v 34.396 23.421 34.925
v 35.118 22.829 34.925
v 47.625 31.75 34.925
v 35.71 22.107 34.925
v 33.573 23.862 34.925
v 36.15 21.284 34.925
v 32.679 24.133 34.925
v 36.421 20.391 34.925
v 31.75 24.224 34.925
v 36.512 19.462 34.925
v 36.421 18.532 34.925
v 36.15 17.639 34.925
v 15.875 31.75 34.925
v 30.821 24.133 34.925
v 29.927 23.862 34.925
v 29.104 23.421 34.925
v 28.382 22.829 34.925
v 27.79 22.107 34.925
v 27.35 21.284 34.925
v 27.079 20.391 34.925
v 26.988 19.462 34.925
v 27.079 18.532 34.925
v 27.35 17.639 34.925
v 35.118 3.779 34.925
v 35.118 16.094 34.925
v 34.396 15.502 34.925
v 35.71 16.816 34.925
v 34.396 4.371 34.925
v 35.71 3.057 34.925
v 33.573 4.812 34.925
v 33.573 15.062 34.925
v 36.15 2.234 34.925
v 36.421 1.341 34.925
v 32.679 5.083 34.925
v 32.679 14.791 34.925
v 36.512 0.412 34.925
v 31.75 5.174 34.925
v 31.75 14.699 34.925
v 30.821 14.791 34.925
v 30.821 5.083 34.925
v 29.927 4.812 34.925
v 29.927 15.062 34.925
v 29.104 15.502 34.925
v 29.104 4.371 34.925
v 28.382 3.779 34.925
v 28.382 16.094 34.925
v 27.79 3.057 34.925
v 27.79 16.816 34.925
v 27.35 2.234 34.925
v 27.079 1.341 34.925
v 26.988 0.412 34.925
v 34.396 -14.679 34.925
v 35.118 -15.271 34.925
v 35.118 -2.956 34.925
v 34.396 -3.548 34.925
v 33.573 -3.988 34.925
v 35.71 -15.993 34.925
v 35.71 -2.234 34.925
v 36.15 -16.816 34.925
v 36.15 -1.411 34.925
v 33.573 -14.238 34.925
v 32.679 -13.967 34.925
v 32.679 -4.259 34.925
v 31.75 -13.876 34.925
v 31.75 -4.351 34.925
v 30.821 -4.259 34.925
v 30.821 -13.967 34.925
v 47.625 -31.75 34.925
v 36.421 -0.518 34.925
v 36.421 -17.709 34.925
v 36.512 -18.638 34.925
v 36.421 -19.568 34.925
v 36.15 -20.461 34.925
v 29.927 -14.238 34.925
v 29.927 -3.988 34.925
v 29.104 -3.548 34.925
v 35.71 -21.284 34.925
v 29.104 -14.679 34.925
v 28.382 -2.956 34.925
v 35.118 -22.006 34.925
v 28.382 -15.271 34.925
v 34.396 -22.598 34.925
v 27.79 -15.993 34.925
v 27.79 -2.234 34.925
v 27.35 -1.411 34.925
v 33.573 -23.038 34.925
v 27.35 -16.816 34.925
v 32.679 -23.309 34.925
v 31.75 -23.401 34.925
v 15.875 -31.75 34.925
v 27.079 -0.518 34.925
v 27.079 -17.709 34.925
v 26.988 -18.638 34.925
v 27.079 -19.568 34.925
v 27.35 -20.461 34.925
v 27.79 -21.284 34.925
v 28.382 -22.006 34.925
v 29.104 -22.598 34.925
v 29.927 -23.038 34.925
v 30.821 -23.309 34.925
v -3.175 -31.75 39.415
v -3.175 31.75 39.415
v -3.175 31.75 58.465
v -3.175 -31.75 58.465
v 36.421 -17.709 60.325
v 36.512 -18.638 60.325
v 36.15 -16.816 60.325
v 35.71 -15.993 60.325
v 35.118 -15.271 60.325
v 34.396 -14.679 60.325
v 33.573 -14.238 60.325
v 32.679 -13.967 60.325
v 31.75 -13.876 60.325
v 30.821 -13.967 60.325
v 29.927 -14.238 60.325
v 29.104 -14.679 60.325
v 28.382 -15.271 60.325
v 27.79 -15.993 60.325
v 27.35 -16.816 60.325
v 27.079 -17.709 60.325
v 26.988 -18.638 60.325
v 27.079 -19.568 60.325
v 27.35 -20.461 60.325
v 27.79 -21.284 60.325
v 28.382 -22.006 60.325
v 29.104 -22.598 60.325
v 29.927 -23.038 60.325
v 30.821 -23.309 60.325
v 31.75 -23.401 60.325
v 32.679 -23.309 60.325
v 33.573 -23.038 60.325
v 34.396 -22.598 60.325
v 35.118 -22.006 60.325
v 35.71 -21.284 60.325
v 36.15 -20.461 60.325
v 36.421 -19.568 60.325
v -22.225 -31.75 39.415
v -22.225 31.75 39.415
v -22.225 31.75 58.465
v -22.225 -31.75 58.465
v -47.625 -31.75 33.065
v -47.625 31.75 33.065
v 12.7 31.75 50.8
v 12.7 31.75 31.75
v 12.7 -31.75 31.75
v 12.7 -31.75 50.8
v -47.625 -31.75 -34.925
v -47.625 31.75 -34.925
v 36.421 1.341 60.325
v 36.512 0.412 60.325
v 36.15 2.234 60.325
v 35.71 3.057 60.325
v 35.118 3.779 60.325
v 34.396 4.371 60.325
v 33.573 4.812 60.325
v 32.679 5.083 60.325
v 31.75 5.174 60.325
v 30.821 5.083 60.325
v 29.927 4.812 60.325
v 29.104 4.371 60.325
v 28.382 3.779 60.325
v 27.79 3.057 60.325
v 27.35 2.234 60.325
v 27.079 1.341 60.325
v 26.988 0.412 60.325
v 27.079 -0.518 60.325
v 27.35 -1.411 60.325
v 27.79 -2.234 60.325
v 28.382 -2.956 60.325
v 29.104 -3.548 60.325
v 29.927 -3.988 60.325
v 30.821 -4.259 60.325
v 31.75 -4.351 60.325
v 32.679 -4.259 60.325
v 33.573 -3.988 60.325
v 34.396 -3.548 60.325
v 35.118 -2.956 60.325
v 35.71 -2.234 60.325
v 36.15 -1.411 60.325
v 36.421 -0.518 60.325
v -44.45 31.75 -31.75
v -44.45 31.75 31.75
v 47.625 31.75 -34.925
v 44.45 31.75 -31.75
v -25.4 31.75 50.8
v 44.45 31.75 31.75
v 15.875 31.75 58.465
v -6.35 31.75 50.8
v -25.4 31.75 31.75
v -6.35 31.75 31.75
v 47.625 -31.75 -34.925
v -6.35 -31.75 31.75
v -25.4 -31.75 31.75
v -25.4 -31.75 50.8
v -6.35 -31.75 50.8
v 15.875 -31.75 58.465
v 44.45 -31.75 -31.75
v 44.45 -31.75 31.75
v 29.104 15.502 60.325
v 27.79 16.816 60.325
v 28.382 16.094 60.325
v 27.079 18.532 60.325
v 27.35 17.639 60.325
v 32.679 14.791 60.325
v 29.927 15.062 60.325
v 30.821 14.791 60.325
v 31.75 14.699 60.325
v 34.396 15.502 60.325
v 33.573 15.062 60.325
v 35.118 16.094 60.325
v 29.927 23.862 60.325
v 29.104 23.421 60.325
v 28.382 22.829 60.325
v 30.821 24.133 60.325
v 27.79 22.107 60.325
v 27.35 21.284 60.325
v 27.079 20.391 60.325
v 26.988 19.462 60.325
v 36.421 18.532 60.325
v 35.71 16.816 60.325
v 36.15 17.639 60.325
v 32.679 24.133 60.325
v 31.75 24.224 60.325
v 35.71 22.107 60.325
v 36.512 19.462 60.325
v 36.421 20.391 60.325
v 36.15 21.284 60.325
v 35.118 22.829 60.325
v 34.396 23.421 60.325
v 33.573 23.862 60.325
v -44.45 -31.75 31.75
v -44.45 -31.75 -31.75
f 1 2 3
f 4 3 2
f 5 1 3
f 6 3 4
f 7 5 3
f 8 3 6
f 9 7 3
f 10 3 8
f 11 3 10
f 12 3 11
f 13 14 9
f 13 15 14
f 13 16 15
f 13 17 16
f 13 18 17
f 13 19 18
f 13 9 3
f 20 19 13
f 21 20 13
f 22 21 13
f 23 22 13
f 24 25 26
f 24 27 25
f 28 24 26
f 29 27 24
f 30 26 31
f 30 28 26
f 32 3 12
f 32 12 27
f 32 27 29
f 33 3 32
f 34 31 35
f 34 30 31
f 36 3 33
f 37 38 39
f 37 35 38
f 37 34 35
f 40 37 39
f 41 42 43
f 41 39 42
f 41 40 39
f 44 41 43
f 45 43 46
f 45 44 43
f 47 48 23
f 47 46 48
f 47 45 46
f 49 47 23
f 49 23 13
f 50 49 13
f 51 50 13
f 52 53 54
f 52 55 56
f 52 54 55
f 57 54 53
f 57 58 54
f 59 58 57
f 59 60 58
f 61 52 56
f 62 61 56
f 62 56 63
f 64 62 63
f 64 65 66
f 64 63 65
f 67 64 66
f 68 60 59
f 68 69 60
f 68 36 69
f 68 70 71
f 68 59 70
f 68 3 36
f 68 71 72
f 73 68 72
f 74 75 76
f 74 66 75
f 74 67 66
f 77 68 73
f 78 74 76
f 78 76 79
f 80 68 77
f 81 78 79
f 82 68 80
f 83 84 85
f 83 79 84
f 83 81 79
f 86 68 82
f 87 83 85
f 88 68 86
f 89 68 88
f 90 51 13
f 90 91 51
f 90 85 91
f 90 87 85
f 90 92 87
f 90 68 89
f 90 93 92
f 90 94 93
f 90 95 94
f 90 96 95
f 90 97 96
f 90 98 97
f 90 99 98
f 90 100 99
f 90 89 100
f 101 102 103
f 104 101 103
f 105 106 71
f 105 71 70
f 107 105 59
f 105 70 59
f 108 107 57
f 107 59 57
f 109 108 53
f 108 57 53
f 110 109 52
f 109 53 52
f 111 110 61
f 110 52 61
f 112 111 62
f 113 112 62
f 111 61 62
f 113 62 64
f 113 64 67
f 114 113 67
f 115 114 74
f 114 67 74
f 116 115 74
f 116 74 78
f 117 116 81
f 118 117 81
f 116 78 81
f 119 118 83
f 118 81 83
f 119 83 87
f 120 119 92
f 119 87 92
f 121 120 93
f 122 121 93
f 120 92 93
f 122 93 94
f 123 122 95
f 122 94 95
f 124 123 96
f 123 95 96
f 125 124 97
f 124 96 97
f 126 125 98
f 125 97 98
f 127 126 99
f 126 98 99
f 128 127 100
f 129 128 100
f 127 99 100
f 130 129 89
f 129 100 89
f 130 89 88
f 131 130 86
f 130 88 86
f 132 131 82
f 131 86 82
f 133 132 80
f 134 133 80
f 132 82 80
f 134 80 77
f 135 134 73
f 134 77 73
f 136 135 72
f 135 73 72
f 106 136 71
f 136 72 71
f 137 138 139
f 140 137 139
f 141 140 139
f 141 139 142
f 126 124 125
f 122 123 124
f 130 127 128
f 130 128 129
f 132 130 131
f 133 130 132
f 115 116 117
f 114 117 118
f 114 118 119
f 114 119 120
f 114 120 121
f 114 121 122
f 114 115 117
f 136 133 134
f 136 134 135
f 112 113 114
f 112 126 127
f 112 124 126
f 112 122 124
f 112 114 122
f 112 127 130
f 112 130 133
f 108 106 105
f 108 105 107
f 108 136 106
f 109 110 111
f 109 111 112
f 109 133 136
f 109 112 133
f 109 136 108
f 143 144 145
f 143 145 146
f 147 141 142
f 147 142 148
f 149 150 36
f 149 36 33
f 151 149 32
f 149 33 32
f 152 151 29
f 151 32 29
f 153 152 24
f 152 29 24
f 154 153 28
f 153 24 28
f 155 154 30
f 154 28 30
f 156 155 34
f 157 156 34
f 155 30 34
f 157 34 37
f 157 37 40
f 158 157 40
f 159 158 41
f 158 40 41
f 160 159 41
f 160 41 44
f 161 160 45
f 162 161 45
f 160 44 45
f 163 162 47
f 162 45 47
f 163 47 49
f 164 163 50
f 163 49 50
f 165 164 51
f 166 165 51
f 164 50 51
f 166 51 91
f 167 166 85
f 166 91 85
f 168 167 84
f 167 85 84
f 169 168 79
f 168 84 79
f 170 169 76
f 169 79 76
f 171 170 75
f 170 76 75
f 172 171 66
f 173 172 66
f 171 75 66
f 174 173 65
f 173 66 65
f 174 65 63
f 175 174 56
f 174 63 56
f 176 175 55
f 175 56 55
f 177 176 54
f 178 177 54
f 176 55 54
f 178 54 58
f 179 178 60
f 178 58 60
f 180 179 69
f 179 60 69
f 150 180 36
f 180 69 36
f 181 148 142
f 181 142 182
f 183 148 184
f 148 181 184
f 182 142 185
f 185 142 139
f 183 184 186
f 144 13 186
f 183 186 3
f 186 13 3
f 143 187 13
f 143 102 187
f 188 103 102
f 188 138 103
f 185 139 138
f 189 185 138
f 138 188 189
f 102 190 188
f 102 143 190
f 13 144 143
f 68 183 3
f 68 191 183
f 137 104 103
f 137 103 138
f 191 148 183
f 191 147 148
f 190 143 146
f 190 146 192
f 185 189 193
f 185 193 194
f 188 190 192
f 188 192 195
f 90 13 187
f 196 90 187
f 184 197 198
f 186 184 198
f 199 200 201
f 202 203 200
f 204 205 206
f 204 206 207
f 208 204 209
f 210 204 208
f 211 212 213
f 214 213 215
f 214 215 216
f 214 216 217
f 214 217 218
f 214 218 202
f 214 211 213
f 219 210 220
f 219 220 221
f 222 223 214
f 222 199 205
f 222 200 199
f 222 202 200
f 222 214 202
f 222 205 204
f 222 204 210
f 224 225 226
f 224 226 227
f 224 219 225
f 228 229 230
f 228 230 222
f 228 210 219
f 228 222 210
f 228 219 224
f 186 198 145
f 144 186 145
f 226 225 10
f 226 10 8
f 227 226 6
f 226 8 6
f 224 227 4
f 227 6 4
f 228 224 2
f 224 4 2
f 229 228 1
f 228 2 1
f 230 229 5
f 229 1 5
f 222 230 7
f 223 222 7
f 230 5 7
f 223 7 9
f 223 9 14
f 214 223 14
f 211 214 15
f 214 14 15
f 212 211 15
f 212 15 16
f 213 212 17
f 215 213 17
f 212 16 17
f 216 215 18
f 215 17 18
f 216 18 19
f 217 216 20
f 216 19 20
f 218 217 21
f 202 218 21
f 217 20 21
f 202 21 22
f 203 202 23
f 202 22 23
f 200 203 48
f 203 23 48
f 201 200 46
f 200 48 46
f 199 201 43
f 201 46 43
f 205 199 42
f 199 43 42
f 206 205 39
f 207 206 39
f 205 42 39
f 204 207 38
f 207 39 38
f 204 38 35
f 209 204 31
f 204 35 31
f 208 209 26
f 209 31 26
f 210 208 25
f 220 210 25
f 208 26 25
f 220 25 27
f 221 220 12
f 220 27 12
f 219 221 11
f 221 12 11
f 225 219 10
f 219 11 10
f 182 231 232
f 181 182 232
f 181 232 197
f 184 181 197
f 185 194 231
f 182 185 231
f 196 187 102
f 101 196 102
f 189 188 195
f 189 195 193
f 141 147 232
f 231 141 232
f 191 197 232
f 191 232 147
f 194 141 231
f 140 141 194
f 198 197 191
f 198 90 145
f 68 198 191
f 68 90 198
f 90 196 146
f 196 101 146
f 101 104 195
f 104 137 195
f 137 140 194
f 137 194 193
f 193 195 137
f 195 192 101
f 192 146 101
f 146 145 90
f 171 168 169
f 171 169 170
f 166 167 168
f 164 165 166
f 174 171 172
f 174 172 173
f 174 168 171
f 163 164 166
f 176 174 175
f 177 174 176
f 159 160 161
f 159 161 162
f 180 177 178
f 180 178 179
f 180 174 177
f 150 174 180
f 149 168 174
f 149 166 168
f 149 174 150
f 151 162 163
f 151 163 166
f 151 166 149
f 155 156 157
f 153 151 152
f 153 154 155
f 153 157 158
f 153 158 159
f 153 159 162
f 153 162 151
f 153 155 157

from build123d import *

# Parameters (mm, degrees)
F2_DEPTH      = 31.75
F2_DEPTH_BACK = 31.75
F3_DEPTH      = 64.516
F3_DEPTH_BACK = 80.518
F4_R          = 4.7625
F5_DEPTH      = 25.4


with BuildPart() as f2:
    # F1 (on Front) → F2 (new body, two sides)
    with BuildSketch(Plane.XZ) as f2_sk:
        Polygon((47.625, 34.925), (15.875, 34.925), (15.875, 58.4651280605), (-3.175, 39.4151280605), (-3.175, 58.4651280605), (-22.225, 39.4151280605), (-22.225, 58.4651280605), (-47.625, 33.0651280605), (-47.625, -34.925), (47.625, -34.925), align=None)
    extrude(amount=F2_DEPTH)
    extrude(f2_sk.sketch, amount=-F2_DEPTH_BACK)

    # F0 (on Front) → F3 (cut, two sides)
    with BuildSketch(Plane.XZ) as f3_sk:
        Polygon((-44.45, -31.75), (44.45, -31.75), (44.45, 31.75), (12.7, 31.75), (12.7, 50.8), (-6.35, 31.75), (-6.35, 50.8), (-25.4, 31.75), (-25.4, 50.8), (-44.45, 31.75), align=None)
    extrude(amount=-F3_DEPTH, mode=Mode.SUBTRACT)
    extrude(f3_sk.sketch, amount=F3_DEPTH_BACK, mode=Mode.SUBTRACT)

    # F4 (on face) → F5 (join)
    with BuildSketch(Plane.XY.offset(34.925)):
        with Locations((31.75, 19.461568445)):
            Circle(F4_R)
        with Locations((31.75, 0.411568445)):
            Circle(F4_R)
        with Locations((31.75, -18.638431555)):
            Circle(F4_R)
    extrude(amount=F5_DEPTH)


solid = f2.part
